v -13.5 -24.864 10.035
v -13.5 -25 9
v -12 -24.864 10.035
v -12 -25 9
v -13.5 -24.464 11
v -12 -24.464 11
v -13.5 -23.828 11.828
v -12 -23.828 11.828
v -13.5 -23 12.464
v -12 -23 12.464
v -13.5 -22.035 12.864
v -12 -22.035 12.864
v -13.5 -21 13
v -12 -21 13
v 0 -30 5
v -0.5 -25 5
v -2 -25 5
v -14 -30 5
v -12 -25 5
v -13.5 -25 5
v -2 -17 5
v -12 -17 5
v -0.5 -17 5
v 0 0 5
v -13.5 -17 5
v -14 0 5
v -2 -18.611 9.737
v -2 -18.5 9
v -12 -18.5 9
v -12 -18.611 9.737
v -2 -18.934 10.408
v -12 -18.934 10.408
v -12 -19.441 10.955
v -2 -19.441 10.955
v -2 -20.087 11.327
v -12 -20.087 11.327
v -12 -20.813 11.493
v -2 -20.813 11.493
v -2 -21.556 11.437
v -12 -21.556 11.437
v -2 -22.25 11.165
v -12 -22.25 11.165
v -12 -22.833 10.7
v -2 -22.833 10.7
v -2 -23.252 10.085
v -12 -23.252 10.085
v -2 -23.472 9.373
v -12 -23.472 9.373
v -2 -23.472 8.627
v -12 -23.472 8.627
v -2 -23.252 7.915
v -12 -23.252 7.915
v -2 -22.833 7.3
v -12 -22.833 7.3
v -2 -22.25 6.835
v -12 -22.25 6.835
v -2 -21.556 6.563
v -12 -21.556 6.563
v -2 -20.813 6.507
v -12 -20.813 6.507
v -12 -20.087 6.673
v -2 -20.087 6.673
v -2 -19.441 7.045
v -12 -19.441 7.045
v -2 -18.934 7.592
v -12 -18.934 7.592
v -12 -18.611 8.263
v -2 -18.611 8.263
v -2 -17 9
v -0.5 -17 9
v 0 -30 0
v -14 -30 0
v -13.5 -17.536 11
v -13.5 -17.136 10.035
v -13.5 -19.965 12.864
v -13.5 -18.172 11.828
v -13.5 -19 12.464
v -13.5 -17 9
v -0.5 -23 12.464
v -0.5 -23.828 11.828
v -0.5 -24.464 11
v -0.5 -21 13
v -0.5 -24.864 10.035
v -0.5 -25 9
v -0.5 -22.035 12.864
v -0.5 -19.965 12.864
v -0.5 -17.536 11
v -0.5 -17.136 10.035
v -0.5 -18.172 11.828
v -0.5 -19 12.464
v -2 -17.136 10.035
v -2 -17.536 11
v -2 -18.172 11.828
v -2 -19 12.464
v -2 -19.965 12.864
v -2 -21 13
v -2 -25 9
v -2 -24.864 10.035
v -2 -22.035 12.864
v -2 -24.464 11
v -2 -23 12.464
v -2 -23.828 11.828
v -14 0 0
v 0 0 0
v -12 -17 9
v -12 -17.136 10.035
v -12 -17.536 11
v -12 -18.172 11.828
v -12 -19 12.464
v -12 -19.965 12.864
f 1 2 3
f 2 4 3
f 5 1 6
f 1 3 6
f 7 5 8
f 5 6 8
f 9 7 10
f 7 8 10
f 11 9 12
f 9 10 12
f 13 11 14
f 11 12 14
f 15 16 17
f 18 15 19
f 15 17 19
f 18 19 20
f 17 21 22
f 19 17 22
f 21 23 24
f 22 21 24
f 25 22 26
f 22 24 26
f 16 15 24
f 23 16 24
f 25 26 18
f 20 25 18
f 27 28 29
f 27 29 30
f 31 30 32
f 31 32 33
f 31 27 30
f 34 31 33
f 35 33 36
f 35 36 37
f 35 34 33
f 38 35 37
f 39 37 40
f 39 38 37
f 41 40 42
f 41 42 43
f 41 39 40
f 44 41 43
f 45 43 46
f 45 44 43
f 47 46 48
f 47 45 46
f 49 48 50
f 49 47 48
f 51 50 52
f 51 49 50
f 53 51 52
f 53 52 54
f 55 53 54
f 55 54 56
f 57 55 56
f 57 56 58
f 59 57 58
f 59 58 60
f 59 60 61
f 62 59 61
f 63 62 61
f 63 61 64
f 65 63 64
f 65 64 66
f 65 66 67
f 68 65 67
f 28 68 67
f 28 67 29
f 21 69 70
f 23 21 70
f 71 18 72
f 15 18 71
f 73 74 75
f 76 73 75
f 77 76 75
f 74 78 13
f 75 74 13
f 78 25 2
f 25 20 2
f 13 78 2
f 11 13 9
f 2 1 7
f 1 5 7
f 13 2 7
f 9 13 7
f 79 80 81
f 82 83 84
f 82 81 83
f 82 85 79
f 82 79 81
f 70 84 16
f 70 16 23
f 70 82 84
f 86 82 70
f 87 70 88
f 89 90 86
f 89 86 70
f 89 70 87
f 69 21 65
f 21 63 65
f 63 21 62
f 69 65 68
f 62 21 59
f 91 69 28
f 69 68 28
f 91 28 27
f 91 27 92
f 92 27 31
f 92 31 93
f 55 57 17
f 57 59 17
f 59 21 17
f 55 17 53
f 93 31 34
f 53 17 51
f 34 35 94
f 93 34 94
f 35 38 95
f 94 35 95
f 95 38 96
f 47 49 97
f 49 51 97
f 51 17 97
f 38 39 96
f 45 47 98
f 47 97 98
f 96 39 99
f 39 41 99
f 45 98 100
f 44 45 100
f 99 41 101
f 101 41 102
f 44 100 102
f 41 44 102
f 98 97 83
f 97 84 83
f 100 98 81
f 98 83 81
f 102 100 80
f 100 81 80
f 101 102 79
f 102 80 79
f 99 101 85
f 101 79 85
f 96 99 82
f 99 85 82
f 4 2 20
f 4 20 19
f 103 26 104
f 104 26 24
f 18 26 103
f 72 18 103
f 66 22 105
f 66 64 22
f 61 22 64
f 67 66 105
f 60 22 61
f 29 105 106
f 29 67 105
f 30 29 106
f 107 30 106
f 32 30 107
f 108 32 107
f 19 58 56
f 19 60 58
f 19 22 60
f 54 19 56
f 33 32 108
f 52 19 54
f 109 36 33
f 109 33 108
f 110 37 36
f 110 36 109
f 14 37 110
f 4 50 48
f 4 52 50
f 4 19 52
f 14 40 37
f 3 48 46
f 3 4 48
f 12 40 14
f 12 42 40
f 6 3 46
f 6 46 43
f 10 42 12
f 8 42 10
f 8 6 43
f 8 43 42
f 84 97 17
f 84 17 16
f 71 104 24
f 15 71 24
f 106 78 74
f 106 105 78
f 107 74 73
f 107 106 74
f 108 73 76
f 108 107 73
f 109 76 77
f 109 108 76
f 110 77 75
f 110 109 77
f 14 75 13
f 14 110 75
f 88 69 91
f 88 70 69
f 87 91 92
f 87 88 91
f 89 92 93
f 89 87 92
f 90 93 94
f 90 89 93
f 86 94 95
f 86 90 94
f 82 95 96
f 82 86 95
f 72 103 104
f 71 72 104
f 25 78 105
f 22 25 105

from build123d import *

# Parameters (mm, degrees)
F1_DEPTH = 30
F3_W     = 1.5
F3_H     = 8
F4_DEPTH = 8
F5_R     = 2.5
F6_DEPTH = 13
F7_R     = 3.99999


# Not quite as in the source:
# - a fillet or chamfer is up to 0.001 mm smaller than in the source, because OpenCascade refuses the exact size


with BuildPart() as f1:
    # F0 (on Front) → F1 (new body)
    with BuildSketch(Plane.XZ):
        Polygon((-14, 0), (0, 0), (0, 5), (-0.5, 5), (-2, 5), (-12, 5), (-13.5, 5), (-14, 5), align=None)
    extrude(amount=F1_DEPTH)

    # F3 (on offset) → F4 (join)
    with BuildSketch(Plane.XZ.offset(25)):
        with Locations((-12.75, 9)):
            Rectangle(F3_W, F3_H)
        with Locations((-1.25, 9)):
            Rectangle(F3_W, F3_H)
    extrude(amount=-F4_DEPTH)

    # F5 (on face) → F6 (join, through all)
    with BuildSketch(Plane.YZ.offset(-0.5)):
        with Locations((-21, 9)):
            Circle(F5_R)
    extrude(amount=-F6_DEPTH)

    # F7 (radius 4 in the source; OpenCascade refuses exactly that, so slightly less here)
    f7_edges = [f1.edges().sort_by_distance(p)[0] for p in [
        (-1.25, -17, 13),
        (-1.25, -25, 13),
        (-12.75, -17, 13),
        (-12.75, -25, 13),
    ]]
    fillet(f7_edges, radius=F7_R)


solid = f1.part
